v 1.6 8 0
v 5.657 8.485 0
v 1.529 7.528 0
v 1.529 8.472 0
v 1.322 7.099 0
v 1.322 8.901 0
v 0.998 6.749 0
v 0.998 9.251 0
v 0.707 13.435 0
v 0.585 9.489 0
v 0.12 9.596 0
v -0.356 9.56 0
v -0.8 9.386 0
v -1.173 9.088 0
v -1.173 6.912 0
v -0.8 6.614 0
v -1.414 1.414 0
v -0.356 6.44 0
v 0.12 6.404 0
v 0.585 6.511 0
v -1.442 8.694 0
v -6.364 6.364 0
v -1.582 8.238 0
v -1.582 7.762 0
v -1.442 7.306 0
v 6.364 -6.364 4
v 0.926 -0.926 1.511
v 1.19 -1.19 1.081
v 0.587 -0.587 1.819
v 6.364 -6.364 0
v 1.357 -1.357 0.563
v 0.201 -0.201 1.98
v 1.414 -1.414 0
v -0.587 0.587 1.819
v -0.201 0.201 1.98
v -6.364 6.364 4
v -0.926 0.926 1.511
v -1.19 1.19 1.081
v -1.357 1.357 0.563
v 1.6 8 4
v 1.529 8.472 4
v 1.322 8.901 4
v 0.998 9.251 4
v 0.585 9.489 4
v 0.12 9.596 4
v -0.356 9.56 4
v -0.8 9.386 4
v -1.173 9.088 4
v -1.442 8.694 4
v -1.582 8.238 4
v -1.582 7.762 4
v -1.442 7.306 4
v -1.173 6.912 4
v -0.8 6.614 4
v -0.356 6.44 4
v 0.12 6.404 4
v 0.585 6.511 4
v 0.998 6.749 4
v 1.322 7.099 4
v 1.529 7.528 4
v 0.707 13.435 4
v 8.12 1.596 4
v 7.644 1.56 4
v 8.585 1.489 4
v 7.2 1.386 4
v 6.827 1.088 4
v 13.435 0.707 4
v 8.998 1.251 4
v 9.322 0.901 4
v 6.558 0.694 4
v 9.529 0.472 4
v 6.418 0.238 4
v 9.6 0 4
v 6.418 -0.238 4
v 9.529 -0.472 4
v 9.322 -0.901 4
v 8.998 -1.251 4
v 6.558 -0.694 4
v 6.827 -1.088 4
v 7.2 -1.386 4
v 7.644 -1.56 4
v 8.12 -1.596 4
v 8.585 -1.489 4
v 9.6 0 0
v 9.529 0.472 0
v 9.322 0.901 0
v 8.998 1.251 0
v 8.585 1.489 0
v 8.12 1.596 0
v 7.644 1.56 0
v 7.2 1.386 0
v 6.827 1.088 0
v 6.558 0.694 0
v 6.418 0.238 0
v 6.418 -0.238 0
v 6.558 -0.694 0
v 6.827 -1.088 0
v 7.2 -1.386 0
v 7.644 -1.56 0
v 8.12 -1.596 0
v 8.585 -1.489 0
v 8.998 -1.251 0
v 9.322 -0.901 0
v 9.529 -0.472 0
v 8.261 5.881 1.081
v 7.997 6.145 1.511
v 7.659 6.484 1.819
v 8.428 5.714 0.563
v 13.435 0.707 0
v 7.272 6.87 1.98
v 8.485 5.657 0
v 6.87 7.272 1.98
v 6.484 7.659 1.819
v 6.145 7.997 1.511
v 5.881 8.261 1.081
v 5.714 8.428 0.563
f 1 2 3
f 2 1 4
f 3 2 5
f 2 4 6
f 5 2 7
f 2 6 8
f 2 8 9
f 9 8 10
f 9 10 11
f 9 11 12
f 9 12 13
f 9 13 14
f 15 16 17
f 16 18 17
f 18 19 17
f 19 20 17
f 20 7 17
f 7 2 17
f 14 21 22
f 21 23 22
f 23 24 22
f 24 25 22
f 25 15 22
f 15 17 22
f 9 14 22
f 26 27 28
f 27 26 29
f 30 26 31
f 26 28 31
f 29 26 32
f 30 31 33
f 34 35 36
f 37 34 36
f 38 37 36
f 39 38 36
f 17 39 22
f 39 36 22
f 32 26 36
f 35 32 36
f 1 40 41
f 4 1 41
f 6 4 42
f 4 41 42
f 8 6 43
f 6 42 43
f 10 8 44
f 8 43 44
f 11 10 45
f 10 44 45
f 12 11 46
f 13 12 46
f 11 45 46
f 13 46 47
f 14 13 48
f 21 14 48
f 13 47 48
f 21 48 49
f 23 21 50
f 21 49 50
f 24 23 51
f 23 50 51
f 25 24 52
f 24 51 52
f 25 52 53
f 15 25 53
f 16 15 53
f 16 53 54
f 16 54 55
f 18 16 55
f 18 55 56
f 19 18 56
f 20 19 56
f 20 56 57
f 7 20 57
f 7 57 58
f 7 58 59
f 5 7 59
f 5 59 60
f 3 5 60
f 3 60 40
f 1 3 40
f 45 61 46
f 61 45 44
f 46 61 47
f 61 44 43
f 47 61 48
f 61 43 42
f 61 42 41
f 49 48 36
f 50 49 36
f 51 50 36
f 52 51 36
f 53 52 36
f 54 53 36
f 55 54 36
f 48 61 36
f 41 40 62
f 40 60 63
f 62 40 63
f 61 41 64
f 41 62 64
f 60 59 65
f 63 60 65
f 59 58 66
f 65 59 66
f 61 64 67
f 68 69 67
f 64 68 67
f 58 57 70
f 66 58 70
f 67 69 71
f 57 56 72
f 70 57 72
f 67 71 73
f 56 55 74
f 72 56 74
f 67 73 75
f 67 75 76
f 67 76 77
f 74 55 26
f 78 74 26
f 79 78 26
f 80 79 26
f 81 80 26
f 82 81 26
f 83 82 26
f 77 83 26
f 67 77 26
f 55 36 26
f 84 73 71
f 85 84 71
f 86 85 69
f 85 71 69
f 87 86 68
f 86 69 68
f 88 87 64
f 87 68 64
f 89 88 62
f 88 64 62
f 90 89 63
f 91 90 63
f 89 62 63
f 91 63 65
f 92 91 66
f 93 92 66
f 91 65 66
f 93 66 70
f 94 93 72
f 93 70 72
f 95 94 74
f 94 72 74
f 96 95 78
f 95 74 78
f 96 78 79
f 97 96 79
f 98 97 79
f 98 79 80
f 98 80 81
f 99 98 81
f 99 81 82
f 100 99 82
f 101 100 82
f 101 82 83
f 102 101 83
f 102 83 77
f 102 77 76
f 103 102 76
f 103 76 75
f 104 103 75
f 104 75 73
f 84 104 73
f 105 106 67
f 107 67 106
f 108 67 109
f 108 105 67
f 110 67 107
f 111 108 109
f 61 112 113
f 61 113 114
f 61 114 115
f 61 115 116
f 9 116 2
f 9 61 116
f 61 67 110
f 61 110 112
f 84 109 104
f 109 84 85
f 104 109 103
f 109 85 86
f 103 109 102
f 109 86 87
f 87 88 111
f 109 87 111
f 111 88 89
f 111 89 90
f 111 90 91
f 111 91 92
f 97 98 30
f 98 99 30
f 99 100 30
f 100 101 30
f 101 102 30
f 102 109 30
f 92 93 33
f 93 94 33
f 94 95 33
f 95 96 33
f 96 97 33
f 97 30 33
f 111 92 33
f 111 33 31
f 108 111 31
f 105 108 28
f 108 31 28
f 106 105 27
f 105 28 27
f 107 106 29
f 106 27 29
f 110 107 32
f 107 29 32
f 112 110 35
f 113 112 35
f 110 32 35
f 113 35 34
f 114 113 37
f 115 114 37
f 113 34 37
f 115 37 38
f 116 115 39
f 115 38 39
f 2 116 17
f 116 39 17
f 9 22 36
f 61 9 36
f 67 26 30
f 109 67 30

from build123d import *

# Parameters (mm, degrees)
EXTRUDE_1_DEPTH     = 10
SKETCH_4_R          = 1.6
CUT_EXTRUDE_1_DEPTH = 10


with BuildPart() as part:
    # 草图3 → 凸台-拉伸1 (new body)
    with BuildSketch(Plane(origin=(0, 0, 0), x_dir=(0, 0, -1), z_dir=(0.7071067811865488, 0.7071067811865464, 0))):
        with BuildLine():
            Line((0, 2), (0, 9))
            Line((0, 9), (-4, 9))
            Line((-4, 9), (-4, -9))
            Line((-4, -9), (0, -9))
            Line((0, -9), (0, -2))
            ThreePointArc((0, -2), (-2, 0), (0, 2))
        make_face()
    extrude(amount=EXTRUDE_1_DEPTH)

    # 草图4 → 切除-拉伸1 (cut)
    with BuildSketch(Plane.XY.offset(4)):
        with Locations((0, 8)):
            Circle(SKETCH_4_R)
        with Locations((8, 0)):
            Circle(SKETCH_4_R)
    extrude(amount=-CUT_EXTRUDE_1_DEPTH, mode=Mode.SUBTRACT)


solid = part.part
